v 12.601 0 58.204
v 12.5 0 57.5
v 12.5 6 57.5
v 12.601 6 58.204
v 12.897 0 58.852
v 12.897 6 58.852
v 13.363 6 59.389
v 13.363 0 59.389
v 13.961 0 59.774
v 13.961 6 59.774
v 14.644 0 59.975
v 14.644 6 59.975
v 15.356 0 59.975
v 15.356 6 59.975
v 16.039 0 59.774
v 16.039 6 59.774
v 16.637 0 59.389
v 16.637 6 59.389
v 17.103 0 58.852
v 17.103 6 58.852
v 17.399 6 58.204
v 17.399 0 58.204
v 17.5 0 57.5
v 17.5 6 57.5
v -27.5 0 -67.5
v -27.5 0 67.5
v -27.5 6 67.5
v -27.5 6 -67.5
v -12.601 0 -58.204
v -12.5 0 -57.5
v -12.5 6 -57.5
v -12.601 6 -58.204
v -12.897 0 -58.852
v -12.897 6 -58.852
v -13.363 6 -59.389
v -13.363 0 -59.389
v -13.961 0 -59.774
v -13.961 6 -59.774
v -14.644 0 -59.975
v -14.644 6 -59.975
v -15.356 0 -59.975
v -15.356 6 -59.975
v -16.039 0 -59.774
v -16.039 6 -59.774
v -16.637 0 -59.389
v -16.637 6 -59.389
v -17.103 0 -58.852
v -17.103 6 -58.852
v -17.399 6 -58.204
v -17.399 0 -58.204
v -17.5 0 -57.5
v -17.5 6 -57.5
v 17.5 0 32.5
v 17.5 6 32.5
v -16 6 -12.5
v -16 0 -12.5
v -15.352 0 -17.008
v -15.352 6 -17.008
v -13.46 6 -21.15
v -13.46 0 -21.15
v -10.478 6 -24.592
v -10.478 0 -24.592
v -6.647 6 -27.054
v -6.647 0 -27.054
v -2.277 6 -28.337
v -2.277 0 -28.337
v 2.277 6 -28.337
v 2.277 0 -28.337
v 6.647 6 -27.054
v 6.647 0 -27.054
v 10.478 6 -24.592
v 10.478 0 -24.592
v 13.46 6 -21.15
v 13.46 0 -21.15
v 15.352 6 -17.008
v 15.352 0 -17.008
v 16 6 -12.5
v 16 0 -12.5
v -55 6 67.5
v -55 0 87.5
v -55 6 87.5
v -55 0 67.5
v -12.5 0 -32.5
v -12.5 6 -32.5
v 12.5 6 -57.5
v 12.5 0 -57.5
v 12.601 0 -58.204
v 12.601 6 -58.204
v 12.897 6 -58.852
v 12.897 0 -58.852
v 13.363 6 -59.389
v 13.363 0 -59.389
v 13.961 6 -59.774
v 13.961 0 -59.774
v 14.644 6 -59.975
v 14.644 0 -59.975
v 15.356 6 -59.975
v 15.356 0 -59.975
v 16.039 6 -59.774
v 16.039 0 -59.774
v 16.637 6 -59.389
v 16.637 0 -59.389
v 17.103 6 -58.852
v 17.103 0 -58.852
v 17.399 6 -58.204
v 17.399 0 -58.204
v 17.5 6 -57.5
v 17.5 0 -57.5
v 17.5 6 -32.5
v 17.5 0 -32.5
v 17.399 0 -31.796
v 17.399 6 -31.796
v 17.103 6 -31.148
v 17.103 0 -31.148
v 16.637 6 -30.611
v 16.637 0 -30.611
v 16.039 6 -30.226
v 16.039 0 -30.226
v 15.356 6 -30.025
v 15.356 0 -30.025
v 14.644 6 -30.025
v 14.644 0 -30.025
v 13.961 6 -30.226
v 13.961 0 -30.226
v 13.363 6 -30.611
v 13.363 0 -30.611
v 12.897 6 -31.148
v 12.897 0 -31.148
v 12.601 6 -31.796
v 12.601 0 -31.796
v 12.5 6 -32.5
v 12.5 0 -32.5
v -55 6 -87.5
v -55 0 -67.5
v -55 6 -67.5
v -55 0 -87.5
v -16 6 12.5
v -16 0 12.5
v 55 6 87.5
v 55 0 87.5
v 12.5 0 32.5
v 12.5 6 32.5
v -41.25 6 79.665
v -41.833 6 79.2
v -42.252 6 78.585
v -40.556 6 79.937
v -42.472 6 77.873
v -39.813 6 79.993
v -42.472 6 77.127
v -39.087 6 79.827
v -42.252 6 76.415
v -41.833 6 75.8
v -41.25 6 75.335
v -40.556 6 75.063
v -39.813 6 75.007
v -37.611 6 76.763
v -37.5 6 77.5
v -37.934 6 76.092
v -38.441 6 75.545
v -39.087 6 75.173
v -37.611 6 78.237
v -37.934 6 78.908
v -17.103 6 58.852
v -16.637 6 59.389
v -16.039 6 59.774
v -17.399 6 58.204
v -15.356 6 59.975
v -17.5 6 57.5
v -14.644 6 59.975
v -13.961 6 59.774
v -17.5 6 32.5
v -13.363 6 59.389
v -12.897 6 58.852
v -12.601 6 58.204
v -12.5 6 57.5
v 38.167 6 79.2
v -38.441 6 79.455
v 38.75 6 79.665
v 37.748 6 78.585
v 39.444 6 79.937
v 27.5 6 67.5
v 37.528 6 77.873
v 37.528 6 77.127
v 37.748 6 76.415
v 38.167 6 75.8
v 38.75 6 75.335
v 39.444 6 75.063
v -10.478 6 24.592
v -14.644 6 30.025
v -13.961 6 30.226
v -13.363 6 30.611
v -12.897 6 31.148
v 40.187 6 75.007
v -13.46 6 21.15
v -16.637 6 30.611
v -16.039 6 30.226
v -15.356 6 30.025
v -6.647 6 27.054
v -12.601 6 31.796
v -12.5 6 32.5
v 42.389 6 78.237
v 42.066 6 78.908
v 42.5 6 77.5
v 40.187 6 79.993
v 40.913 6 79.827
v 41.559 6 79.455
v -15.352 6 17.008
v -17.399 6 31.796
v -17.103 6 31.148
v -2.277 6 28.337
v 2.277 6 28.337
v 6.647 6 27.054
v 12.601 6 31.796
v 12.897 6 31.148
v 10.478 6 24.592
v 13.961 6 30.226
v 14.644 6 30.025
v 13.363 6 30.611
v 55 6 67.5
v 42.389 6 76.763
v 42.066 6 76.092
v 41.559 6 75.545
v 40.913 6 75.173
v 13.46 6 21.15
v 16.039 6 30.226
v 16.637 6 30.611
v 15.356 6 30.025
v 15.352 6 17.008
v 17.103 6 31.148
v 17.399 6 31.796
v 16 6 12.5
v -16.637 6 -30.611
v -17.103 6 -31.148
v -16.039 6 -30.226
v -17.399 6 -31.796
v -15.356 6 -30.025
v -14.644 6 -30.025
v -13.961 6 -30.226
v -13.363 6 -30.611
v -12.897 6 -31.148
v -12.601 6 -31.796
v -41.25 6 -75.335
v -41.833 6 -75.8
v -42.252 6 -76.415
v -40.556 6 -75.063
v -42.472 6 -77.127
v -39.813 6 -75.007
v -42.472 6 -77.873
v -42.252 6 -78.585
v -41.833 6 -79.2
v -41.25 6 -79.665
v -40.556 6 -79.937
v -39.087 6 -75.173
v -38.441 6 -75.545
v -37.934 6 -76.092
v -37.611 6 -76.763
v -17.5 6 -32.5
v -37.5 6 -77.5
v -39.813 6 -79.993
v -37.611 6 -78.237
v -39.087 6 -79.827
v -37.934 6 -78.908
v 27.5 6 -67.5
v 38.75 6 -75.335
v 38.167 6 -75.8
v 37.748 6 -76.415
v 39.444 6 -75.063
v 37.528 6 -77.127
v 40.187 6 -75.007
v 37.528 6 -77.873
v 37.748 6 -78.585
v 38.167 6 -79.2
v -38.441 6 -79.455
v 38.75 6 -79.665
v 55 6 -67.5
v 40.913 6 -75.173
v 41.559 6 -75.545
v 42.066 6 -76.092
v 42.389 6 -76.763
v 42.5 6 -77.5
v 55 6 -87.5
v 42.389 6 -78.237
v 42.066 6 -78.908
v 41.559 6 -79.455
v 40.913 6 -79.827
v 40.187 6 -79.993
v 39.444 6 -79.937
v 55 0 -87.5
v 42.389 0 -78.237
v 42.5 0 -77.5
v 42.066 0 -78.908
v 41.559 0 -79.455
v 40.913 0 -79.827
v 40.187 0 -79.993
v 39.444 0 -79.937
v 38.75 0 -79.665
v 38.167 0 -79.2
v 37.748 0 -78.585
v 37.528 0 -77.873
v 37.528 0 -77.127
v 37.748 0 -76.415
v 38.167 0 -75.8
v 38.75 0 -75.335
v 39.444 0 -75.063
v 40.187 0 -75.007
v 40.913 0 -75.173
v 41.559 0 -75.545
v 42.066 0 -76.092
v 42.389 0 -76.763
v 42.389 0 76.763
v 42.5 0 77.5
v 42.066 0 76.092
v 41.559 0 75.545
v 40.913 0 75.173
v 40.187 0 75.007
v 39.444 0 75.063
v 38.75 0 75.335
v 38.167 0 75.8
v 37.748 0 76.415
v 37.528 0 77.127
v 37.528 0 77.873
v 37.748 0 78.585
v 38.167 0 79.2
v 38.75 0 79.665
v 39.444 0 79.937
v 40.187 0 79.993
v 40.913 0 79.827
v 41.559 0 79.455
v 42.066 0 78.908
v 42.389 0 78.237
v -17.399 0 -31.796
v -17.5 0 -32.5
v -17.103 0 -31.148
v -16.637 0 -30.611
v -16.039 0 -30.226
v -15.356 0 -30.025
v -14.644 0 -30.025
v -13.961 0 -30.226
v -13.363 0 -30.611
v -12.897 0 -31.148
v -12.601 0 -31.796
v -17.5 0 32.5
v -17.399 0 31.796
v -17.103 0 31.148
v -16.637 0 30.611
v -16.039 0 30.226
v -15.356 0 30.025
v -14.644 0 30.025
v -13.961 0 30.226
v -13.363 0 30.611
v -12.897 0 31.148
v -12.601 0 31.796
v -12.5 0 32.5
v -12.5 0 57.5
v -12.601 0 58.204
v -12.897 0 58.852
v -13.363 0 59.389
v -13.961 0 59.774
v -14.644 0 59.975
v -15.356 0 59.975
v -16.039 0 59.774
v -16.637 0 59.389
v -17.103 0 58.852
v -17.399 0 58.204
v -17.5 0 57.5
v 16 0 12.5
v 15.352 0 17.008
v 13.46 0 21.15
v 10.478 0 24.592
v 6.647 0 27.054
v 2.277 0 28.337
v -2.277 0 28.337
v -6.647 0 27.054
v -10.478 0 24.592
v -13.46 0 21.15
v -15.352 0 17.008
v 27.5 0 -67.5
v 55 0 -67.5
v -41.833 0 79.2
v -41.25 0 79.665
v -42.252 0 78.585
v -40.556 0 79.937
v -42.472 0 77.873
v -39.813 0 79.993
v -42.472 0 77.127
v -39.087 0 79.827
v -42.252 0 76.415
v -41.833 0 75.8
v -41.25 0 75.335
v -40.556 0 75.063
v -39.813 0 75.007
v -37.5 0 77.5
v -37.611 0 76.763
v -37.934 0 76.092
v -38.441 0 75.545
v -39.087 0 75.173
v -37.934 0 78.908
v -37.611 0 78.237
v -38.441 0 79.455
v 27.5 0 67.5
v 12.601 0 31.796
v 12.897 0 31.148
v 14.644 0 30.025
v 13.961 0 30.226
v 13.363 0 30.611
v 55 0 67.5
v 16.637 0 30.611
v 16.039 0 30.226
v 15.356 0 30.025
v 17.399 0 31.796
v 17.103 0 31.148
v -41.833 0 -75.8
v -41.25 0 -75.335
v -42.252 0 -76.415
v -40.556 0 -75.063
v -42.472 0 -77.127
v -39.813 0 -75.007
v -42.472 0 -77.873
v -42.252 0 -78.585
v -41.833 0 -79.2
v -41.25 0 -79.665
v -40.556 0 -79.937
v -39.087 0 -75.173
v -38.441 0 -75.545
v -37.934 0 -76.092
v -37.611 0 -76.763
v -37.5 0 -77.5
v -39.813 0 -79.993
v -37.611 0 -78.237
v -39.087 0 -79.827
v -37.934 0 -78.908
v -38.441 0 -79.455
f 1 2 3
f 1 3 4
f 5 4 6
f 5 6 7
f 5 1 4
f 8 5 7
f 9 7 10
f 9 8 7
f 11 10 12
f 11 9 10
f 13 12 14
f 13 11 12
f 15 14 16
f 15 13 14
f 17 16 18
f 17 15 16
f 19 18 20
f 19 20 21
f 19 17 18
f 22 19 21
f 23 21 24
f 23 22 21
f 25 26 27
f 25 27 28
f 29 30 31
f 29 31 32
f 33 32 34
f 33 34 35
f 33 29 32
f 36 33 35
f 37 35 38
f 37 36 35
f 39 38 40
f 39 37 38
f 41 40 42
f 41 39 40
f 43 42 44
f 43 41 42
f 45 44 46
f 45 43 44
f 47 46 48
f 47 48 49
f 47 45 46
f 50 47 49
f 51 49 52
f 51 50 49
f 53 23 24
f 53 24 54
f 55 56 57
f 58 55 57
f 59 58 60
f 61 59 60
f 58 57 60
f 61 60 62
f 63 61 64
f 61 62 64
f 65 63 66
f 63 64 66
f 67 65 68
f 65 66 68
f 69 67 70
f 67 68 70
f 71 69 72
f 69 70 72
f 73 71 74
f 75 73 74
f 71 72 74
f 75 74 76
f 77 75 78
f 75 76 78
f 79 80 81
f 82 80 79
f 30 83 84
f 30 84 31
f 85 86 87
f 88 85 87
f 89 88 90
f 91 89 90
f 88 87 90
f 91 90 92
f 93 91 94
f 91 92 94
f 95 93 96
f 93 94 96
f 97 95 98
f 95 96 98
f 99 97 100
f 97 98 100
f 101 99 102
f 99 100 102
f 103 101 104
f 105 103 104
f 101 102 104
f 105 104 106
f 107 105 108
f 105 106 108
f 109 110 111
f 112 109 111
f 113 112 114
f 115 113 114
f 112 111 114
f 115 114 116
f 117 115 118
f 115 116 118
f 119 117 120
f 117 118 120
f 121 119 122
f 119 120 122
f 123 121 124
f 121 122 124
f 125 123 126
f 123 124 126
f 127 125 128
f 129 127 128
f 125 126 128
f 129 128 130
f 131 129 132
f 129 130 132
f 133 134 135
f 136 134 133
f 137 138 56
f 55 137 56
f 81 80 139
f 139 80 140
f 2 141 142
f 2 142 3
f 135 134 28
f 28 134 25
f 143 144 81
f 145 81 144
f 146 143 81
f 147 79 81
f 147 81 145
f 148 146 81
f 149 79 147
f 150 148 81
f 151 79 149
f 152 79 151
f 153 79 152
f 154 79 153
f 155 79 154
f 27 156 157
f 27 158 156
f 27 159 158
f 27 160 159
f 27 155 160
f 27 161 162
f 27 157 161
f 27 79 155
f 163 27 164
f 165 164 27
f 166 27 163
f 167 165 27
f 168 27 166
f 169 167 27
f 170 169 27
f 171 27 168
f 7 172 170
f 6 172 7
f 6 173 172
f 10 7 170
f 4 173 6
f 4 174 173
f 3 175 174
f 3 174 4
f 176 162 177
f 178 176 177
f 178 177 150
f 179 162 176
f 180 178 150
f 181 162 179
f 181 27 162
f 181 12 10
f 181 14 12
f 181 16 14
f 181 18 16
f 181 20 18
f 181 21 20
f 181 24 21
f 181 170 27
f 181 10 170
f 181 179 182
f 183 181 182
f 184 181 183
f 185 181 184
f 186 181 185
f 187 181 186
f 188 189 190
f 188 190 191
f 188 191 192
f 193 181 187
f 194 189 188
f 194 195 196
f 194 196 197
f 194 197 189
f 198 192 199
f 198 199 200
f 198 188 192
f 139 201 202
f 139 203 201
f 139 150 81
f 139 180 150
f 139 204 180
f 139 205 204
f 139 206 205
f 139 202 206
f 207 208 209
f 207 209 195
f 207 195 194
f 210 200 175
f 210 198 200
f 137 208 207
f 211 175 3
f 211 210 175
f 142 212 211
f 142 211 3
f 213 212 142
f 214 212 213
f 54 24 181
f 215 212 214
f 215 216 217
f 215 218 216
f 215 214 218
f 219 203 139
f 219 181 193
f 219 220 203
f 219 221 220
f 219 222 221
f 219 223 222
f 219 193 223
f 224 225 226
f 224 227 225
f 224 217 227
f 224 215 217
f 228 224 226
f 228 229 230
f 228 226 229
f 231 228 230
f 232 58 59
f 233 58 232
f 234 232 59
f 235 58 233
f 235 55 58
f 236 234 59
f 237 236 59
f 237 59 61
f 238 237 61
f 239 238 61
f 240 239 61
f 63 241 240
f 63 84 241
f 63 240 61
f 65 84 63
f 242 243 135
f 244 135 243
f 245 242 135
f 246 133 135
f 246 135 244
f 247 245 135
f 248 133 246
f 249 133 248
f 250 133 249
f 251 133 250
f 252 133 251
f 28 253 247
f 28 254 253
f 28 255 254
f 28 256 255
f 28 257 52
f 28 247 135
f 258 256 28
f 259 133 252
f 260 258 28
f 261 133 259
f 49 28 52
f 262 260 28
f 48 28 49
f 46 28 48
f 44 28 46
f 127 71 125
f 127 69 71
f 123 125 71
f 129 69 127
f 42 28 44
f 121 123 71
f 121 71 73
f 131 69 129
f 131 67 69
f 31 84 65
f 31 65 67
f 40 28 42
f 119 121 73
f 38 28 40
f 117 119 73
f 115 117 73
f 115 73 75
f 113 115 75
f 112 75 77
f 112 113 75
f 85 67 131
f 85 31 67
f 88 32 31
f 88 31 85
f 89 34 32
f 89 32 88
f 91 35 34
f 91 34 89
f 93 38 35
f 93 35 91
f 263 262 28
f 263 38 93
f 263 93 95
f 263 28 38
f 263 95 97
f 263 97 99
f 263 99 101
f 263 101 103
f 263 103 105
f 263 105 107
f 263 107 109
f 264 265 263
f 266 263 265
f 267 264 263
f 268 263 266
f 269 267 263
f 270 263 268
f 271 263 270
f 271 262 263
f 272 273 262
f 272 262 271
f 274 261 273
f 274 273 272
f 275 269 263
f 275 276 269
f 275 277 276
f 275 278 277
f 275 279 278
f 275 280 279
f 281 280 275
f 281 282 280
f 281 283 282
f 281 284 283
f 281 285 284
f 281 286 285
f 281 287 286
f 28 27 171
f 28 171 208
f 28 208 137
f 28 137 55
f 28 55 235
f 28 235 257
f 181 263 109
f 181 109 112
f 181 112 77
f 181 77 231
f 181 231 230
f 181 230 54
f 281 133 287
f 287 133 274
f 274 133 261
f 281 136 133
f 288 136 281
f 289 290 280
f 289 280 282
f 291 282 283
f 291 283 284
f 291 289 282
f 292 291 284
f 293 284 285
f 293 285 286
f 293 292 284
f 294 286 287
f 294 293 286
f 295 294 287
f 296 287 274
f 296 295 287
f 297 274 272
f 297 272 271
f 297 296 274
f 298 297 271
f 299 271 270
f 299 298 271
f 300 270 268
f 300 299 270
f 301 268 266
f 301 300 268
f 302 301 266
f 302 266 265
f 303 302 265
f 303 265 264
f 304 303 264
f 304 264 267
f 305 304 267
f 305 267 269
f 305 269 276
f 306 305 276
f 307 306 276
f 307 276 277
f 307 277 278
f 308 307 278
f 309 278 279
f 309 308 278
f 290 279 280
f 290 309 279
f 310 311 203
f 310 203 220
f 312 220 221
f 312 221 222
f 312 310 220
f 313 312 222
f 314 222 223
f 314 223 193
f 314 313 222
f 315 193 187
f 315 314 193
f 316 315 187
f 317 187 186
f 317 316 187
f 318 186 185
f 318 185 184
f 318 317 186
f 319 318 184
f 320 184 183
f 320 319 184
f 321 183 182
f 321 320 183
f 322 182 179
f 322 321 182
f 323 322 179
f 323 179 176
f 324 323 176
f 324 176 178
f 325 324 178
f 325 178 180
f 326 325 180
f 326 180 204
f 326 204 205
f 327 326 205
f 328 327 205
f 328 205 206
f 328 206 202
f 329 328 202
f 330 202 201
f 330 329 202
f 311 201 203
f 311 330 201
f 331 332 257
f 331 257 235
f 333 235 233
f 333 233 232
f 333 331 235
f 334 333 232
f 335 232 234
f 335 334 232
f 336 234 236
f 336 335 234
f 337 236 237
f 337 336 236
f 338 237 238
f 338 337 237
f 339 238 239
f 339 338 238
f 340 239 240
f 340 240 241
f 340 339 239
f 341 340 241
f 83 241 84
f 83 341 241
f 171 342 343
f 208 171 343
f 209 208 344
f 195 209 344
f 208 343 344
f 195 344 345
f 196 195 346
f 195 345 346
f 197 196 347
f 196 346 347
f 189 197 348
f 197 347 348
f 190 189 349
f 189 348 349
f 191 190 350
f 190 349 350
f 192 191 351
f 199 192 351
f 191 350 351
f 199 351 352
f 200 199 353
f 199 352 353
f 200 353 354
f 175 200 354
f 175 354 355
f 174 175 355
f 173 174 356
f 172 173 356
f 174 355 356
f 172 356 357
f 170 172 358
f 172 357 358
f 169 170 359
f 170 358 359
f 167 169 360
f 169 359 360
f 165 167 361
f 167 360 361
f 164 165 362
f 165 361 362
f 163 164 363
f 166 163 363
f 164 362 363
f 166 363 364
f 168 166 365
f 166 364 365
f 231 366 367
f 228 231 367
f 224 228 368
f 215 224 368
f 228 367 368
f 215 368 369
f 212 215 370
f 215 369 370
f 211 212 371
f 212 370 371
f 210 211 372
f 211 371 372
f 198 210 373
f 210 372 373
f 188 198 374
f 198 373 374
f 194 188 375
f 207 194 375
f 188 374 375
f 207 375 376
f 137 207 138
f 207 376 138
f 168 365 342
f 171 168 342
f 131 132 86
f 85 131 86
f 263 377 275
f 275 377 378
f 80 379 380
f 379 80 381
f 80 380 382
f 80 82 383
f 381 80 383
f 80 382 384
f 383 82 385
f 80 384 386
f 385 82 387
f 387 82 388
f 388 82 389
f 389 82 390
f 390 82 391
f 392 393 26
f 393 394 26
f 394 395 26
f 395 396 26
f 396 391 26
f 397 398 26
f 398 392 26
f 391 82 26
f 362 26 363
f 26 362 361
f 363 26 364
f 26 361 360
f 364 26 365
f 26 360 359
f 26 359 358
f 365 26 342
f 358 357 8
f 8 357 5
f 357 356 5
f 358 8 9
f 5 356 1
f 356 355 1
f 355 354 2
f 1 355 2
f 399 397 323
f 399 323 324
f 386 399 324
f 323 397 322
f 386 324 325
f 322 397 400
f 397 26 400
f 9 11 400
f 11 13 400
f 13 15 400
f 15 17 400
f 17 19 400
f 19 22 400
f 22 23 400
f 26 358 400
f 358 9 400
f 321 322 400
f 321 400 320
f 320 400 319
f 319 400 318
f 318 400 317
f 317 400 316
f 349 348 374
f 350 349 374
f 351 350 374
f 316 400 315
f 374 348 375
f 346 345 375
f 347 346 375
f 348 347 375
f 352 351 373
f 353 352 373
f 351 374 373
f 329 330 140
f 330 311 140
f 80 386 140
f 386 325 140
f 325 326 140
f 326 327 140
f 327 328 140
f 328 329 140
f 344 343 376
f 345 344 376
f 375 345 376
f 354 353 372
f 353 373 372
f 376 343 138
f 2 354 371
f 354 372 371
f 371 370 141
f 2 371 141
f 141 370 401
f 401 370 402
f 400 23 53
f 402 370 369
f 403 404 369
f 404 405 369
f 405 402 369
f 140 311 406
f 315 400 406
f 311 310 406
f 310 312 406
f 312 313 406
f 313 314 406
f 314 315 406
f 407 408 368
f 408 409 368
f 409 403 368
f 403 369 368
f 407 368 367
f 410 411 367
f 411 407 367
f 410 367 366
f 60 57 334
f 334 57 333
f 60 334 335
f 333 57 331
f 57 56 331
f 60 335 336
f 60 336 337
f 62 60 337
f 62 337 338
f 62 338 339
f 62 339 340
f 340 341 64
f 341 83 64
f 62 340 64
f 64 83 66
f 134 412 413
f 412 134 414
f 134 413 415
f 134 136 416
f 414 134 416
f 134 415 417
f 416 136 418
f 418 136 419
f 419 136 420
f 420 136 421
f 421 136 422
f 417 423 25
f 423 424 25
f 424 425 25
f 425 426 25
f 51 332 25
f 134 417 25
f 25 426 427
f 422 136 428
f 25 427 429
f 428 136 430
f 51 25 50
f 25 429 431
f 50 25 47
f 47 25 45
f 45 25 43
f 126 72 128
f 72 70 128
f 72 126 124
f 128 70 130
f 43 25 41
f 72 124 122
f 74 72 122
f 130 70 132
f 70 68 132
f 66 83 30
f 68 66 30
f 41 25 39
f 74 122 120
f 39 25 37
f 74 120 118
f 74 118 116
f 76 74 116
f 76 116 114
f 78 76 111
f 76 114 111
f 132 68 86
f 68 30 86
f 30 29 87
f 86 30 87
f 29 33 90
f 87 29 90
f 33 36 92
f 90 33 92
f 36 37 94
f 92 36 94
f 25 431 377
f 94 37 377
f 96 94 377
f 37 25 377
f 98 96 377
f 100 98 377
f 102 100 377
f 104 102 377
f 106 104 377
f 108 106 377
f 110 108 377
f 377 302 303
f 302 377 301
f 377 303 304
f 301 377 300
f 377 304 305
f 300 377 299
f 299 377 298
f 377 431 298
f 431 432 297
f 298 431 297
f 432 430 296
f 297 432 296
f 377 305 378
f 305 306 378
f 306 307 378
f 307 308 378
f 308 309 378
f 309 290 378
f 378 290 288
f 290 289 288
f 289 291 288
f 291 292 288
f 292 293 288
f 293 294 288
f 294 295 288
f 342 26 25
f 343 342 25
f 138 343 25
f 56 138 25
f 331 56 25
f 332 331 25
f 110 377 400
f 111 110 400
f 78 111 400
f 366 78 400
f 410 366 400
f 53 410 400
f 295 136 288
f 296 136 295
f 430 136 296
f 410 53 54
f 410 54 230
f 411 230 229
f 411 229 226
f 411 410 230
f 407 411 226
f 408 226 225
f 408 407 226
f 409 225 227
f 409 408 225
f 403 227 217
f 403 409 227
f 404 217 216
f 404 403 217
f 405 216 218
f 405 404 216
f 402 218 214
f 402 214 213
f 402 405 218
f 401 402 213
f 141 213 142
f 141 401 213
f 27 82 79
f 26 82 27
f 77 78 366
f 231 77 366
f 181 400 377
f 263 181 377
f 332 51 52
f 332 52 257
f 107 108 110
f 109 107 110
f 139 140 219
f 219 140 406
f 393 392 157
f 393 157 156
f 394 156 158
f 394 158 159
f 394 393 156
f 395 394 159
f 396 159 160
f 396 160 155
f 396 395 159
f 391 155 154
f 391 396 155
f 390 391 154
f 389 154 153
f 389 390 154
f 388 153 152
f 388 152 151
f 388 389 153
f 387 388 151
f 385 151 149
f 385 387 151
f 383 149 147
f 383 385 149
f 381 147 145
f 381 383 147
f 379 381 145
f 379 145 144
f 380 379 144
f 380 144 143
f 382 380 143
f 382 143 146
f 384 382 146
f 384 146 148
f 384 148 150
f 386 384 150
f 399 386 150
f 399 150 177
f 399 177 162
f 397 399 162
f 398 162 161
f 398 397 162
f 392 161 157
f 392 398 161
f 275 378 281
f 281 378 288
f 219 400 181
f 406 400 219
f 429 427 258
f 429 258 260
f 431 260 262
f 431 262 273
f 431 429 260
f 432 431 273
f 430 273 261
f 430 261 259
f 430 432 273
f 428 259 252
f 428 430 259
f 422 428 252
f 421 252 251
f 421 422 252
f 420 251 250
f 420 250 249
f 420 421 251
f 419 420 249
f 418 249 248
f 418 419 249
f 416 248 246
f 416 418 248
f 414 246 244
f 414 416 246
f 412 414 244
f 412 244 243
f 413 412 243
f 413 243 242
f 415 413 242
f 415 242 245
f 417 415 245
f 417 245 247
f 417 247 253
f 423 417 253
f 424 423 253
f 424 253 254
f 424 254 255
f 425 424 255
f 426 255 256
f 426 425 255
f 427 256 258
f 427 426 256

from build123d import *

# Parameters (mm, degrees)
SKETCH1_W           = 55
SKETCH1_H           = 135
SKETCH1_W_2         = 110
SKETCH1_H_2         = 20
SKETCH1_R           = 2.5
BOSS_EXTRUDE1_DEPTH = 6


with BuildPart() as part:
    # Sketch1 → Boss-Extrude1 (new body)
    with BuildSketch(Plane(origin=(0, 0, 0), x_dir=(1, 0, 0), z_dir=(0, 1, 0))):
        Rectangle(SKETCH1_W, SKETCH1_H)
        with BuildLine():
            Line((-16, -12.5), (-16, 12.5))
            ThreePointArc((-16, 12.5), (0, 28.5), (16, 12.5))
            Line((16, 12.5), (16, -12.5))
            ThreePointArc((16, -12.5), (0, -28.5), (-16, -12.5))
        make_face(mode=Mode.SUBTRACT)
        with BuildLine():
            Line((-12.5, -32.5), (-12.5, -57.5))
            ThreePointArc((-12.5, -57.5), (-15, -60), (-17.5, -57.5))
            Line((-17.5, -57.5), (-17.5, -32.5))
            ThreePointArc((-17.5, -32.5), (-15, -30), (-12.5, -32.5))
        make_face(mode=Mode.SUBTRACT)
        with BuildLine():
            Line((-12.5, 32.5), (-12.5, 57.5))
            ThreePointArc((-12.5, 57.5), (-15, 60), (-17.5, 57.5))
            Line((-17.5, 57.5), (-17.5, 32.5))
            ThreePointArc((-17.5, 32.5), (-15, 30), (-12.5, 32.5))
        make_face(mode=Mode.SUBTRACT)
        with BuildLine():
            Line((12.5, -32.5), (12.5, -57.5))
            ThreePointArc((12.5, -57.5), (15, -60), (17.5, -57.5))
            Line((17.5, -57.5), (17.5, -32.5))
            ThreePointArc((17.5, -32.5), (15, -30), (12.5, -32.5))
        make_face(mode=Mode.SUBTRACT)
        with BuildLine():
            Line((12.5, 32.5), (12.5, 57.5))
            ThreePointArc((12.5, 57.5), (15, 60), (17.5, 57.5))
            Line((17.5, 57.5), (17.5, 32.5))
            ThreePointArc((17.5, 32.5), (15, 30), (12.5, 32.5))
        make_face(mode=Mode.SUBTRACT)
        with Locations((0, -77.5)):
            Rectangle(SKETCH1_W_2, SKETCH1_H_2)
        with Locations((-40, -77.5)):
            Circle(SKETCH1_R, mode=Mode.SUBTRACT)
        with Locations((40, -77.5)):
            Circle(SKETCH1_R, mode=Mode.SUBTRACT)
        with Locations((0, 77.5)):
            Rectangle(SKETCH1_W_2, SKETCH1_H_2)
        with Locations((40, 77.5)):
            Circle(SKETCH1_R, mode=Mode.SUBTRACT)
        with Locations((-40, 77.5)):
            Circle(SKETCH1_R, mode=Mode.SUBTRACT)
    extrude(amount=BOSS_EXTRUDE1_DEPTH)


solid = part.part
